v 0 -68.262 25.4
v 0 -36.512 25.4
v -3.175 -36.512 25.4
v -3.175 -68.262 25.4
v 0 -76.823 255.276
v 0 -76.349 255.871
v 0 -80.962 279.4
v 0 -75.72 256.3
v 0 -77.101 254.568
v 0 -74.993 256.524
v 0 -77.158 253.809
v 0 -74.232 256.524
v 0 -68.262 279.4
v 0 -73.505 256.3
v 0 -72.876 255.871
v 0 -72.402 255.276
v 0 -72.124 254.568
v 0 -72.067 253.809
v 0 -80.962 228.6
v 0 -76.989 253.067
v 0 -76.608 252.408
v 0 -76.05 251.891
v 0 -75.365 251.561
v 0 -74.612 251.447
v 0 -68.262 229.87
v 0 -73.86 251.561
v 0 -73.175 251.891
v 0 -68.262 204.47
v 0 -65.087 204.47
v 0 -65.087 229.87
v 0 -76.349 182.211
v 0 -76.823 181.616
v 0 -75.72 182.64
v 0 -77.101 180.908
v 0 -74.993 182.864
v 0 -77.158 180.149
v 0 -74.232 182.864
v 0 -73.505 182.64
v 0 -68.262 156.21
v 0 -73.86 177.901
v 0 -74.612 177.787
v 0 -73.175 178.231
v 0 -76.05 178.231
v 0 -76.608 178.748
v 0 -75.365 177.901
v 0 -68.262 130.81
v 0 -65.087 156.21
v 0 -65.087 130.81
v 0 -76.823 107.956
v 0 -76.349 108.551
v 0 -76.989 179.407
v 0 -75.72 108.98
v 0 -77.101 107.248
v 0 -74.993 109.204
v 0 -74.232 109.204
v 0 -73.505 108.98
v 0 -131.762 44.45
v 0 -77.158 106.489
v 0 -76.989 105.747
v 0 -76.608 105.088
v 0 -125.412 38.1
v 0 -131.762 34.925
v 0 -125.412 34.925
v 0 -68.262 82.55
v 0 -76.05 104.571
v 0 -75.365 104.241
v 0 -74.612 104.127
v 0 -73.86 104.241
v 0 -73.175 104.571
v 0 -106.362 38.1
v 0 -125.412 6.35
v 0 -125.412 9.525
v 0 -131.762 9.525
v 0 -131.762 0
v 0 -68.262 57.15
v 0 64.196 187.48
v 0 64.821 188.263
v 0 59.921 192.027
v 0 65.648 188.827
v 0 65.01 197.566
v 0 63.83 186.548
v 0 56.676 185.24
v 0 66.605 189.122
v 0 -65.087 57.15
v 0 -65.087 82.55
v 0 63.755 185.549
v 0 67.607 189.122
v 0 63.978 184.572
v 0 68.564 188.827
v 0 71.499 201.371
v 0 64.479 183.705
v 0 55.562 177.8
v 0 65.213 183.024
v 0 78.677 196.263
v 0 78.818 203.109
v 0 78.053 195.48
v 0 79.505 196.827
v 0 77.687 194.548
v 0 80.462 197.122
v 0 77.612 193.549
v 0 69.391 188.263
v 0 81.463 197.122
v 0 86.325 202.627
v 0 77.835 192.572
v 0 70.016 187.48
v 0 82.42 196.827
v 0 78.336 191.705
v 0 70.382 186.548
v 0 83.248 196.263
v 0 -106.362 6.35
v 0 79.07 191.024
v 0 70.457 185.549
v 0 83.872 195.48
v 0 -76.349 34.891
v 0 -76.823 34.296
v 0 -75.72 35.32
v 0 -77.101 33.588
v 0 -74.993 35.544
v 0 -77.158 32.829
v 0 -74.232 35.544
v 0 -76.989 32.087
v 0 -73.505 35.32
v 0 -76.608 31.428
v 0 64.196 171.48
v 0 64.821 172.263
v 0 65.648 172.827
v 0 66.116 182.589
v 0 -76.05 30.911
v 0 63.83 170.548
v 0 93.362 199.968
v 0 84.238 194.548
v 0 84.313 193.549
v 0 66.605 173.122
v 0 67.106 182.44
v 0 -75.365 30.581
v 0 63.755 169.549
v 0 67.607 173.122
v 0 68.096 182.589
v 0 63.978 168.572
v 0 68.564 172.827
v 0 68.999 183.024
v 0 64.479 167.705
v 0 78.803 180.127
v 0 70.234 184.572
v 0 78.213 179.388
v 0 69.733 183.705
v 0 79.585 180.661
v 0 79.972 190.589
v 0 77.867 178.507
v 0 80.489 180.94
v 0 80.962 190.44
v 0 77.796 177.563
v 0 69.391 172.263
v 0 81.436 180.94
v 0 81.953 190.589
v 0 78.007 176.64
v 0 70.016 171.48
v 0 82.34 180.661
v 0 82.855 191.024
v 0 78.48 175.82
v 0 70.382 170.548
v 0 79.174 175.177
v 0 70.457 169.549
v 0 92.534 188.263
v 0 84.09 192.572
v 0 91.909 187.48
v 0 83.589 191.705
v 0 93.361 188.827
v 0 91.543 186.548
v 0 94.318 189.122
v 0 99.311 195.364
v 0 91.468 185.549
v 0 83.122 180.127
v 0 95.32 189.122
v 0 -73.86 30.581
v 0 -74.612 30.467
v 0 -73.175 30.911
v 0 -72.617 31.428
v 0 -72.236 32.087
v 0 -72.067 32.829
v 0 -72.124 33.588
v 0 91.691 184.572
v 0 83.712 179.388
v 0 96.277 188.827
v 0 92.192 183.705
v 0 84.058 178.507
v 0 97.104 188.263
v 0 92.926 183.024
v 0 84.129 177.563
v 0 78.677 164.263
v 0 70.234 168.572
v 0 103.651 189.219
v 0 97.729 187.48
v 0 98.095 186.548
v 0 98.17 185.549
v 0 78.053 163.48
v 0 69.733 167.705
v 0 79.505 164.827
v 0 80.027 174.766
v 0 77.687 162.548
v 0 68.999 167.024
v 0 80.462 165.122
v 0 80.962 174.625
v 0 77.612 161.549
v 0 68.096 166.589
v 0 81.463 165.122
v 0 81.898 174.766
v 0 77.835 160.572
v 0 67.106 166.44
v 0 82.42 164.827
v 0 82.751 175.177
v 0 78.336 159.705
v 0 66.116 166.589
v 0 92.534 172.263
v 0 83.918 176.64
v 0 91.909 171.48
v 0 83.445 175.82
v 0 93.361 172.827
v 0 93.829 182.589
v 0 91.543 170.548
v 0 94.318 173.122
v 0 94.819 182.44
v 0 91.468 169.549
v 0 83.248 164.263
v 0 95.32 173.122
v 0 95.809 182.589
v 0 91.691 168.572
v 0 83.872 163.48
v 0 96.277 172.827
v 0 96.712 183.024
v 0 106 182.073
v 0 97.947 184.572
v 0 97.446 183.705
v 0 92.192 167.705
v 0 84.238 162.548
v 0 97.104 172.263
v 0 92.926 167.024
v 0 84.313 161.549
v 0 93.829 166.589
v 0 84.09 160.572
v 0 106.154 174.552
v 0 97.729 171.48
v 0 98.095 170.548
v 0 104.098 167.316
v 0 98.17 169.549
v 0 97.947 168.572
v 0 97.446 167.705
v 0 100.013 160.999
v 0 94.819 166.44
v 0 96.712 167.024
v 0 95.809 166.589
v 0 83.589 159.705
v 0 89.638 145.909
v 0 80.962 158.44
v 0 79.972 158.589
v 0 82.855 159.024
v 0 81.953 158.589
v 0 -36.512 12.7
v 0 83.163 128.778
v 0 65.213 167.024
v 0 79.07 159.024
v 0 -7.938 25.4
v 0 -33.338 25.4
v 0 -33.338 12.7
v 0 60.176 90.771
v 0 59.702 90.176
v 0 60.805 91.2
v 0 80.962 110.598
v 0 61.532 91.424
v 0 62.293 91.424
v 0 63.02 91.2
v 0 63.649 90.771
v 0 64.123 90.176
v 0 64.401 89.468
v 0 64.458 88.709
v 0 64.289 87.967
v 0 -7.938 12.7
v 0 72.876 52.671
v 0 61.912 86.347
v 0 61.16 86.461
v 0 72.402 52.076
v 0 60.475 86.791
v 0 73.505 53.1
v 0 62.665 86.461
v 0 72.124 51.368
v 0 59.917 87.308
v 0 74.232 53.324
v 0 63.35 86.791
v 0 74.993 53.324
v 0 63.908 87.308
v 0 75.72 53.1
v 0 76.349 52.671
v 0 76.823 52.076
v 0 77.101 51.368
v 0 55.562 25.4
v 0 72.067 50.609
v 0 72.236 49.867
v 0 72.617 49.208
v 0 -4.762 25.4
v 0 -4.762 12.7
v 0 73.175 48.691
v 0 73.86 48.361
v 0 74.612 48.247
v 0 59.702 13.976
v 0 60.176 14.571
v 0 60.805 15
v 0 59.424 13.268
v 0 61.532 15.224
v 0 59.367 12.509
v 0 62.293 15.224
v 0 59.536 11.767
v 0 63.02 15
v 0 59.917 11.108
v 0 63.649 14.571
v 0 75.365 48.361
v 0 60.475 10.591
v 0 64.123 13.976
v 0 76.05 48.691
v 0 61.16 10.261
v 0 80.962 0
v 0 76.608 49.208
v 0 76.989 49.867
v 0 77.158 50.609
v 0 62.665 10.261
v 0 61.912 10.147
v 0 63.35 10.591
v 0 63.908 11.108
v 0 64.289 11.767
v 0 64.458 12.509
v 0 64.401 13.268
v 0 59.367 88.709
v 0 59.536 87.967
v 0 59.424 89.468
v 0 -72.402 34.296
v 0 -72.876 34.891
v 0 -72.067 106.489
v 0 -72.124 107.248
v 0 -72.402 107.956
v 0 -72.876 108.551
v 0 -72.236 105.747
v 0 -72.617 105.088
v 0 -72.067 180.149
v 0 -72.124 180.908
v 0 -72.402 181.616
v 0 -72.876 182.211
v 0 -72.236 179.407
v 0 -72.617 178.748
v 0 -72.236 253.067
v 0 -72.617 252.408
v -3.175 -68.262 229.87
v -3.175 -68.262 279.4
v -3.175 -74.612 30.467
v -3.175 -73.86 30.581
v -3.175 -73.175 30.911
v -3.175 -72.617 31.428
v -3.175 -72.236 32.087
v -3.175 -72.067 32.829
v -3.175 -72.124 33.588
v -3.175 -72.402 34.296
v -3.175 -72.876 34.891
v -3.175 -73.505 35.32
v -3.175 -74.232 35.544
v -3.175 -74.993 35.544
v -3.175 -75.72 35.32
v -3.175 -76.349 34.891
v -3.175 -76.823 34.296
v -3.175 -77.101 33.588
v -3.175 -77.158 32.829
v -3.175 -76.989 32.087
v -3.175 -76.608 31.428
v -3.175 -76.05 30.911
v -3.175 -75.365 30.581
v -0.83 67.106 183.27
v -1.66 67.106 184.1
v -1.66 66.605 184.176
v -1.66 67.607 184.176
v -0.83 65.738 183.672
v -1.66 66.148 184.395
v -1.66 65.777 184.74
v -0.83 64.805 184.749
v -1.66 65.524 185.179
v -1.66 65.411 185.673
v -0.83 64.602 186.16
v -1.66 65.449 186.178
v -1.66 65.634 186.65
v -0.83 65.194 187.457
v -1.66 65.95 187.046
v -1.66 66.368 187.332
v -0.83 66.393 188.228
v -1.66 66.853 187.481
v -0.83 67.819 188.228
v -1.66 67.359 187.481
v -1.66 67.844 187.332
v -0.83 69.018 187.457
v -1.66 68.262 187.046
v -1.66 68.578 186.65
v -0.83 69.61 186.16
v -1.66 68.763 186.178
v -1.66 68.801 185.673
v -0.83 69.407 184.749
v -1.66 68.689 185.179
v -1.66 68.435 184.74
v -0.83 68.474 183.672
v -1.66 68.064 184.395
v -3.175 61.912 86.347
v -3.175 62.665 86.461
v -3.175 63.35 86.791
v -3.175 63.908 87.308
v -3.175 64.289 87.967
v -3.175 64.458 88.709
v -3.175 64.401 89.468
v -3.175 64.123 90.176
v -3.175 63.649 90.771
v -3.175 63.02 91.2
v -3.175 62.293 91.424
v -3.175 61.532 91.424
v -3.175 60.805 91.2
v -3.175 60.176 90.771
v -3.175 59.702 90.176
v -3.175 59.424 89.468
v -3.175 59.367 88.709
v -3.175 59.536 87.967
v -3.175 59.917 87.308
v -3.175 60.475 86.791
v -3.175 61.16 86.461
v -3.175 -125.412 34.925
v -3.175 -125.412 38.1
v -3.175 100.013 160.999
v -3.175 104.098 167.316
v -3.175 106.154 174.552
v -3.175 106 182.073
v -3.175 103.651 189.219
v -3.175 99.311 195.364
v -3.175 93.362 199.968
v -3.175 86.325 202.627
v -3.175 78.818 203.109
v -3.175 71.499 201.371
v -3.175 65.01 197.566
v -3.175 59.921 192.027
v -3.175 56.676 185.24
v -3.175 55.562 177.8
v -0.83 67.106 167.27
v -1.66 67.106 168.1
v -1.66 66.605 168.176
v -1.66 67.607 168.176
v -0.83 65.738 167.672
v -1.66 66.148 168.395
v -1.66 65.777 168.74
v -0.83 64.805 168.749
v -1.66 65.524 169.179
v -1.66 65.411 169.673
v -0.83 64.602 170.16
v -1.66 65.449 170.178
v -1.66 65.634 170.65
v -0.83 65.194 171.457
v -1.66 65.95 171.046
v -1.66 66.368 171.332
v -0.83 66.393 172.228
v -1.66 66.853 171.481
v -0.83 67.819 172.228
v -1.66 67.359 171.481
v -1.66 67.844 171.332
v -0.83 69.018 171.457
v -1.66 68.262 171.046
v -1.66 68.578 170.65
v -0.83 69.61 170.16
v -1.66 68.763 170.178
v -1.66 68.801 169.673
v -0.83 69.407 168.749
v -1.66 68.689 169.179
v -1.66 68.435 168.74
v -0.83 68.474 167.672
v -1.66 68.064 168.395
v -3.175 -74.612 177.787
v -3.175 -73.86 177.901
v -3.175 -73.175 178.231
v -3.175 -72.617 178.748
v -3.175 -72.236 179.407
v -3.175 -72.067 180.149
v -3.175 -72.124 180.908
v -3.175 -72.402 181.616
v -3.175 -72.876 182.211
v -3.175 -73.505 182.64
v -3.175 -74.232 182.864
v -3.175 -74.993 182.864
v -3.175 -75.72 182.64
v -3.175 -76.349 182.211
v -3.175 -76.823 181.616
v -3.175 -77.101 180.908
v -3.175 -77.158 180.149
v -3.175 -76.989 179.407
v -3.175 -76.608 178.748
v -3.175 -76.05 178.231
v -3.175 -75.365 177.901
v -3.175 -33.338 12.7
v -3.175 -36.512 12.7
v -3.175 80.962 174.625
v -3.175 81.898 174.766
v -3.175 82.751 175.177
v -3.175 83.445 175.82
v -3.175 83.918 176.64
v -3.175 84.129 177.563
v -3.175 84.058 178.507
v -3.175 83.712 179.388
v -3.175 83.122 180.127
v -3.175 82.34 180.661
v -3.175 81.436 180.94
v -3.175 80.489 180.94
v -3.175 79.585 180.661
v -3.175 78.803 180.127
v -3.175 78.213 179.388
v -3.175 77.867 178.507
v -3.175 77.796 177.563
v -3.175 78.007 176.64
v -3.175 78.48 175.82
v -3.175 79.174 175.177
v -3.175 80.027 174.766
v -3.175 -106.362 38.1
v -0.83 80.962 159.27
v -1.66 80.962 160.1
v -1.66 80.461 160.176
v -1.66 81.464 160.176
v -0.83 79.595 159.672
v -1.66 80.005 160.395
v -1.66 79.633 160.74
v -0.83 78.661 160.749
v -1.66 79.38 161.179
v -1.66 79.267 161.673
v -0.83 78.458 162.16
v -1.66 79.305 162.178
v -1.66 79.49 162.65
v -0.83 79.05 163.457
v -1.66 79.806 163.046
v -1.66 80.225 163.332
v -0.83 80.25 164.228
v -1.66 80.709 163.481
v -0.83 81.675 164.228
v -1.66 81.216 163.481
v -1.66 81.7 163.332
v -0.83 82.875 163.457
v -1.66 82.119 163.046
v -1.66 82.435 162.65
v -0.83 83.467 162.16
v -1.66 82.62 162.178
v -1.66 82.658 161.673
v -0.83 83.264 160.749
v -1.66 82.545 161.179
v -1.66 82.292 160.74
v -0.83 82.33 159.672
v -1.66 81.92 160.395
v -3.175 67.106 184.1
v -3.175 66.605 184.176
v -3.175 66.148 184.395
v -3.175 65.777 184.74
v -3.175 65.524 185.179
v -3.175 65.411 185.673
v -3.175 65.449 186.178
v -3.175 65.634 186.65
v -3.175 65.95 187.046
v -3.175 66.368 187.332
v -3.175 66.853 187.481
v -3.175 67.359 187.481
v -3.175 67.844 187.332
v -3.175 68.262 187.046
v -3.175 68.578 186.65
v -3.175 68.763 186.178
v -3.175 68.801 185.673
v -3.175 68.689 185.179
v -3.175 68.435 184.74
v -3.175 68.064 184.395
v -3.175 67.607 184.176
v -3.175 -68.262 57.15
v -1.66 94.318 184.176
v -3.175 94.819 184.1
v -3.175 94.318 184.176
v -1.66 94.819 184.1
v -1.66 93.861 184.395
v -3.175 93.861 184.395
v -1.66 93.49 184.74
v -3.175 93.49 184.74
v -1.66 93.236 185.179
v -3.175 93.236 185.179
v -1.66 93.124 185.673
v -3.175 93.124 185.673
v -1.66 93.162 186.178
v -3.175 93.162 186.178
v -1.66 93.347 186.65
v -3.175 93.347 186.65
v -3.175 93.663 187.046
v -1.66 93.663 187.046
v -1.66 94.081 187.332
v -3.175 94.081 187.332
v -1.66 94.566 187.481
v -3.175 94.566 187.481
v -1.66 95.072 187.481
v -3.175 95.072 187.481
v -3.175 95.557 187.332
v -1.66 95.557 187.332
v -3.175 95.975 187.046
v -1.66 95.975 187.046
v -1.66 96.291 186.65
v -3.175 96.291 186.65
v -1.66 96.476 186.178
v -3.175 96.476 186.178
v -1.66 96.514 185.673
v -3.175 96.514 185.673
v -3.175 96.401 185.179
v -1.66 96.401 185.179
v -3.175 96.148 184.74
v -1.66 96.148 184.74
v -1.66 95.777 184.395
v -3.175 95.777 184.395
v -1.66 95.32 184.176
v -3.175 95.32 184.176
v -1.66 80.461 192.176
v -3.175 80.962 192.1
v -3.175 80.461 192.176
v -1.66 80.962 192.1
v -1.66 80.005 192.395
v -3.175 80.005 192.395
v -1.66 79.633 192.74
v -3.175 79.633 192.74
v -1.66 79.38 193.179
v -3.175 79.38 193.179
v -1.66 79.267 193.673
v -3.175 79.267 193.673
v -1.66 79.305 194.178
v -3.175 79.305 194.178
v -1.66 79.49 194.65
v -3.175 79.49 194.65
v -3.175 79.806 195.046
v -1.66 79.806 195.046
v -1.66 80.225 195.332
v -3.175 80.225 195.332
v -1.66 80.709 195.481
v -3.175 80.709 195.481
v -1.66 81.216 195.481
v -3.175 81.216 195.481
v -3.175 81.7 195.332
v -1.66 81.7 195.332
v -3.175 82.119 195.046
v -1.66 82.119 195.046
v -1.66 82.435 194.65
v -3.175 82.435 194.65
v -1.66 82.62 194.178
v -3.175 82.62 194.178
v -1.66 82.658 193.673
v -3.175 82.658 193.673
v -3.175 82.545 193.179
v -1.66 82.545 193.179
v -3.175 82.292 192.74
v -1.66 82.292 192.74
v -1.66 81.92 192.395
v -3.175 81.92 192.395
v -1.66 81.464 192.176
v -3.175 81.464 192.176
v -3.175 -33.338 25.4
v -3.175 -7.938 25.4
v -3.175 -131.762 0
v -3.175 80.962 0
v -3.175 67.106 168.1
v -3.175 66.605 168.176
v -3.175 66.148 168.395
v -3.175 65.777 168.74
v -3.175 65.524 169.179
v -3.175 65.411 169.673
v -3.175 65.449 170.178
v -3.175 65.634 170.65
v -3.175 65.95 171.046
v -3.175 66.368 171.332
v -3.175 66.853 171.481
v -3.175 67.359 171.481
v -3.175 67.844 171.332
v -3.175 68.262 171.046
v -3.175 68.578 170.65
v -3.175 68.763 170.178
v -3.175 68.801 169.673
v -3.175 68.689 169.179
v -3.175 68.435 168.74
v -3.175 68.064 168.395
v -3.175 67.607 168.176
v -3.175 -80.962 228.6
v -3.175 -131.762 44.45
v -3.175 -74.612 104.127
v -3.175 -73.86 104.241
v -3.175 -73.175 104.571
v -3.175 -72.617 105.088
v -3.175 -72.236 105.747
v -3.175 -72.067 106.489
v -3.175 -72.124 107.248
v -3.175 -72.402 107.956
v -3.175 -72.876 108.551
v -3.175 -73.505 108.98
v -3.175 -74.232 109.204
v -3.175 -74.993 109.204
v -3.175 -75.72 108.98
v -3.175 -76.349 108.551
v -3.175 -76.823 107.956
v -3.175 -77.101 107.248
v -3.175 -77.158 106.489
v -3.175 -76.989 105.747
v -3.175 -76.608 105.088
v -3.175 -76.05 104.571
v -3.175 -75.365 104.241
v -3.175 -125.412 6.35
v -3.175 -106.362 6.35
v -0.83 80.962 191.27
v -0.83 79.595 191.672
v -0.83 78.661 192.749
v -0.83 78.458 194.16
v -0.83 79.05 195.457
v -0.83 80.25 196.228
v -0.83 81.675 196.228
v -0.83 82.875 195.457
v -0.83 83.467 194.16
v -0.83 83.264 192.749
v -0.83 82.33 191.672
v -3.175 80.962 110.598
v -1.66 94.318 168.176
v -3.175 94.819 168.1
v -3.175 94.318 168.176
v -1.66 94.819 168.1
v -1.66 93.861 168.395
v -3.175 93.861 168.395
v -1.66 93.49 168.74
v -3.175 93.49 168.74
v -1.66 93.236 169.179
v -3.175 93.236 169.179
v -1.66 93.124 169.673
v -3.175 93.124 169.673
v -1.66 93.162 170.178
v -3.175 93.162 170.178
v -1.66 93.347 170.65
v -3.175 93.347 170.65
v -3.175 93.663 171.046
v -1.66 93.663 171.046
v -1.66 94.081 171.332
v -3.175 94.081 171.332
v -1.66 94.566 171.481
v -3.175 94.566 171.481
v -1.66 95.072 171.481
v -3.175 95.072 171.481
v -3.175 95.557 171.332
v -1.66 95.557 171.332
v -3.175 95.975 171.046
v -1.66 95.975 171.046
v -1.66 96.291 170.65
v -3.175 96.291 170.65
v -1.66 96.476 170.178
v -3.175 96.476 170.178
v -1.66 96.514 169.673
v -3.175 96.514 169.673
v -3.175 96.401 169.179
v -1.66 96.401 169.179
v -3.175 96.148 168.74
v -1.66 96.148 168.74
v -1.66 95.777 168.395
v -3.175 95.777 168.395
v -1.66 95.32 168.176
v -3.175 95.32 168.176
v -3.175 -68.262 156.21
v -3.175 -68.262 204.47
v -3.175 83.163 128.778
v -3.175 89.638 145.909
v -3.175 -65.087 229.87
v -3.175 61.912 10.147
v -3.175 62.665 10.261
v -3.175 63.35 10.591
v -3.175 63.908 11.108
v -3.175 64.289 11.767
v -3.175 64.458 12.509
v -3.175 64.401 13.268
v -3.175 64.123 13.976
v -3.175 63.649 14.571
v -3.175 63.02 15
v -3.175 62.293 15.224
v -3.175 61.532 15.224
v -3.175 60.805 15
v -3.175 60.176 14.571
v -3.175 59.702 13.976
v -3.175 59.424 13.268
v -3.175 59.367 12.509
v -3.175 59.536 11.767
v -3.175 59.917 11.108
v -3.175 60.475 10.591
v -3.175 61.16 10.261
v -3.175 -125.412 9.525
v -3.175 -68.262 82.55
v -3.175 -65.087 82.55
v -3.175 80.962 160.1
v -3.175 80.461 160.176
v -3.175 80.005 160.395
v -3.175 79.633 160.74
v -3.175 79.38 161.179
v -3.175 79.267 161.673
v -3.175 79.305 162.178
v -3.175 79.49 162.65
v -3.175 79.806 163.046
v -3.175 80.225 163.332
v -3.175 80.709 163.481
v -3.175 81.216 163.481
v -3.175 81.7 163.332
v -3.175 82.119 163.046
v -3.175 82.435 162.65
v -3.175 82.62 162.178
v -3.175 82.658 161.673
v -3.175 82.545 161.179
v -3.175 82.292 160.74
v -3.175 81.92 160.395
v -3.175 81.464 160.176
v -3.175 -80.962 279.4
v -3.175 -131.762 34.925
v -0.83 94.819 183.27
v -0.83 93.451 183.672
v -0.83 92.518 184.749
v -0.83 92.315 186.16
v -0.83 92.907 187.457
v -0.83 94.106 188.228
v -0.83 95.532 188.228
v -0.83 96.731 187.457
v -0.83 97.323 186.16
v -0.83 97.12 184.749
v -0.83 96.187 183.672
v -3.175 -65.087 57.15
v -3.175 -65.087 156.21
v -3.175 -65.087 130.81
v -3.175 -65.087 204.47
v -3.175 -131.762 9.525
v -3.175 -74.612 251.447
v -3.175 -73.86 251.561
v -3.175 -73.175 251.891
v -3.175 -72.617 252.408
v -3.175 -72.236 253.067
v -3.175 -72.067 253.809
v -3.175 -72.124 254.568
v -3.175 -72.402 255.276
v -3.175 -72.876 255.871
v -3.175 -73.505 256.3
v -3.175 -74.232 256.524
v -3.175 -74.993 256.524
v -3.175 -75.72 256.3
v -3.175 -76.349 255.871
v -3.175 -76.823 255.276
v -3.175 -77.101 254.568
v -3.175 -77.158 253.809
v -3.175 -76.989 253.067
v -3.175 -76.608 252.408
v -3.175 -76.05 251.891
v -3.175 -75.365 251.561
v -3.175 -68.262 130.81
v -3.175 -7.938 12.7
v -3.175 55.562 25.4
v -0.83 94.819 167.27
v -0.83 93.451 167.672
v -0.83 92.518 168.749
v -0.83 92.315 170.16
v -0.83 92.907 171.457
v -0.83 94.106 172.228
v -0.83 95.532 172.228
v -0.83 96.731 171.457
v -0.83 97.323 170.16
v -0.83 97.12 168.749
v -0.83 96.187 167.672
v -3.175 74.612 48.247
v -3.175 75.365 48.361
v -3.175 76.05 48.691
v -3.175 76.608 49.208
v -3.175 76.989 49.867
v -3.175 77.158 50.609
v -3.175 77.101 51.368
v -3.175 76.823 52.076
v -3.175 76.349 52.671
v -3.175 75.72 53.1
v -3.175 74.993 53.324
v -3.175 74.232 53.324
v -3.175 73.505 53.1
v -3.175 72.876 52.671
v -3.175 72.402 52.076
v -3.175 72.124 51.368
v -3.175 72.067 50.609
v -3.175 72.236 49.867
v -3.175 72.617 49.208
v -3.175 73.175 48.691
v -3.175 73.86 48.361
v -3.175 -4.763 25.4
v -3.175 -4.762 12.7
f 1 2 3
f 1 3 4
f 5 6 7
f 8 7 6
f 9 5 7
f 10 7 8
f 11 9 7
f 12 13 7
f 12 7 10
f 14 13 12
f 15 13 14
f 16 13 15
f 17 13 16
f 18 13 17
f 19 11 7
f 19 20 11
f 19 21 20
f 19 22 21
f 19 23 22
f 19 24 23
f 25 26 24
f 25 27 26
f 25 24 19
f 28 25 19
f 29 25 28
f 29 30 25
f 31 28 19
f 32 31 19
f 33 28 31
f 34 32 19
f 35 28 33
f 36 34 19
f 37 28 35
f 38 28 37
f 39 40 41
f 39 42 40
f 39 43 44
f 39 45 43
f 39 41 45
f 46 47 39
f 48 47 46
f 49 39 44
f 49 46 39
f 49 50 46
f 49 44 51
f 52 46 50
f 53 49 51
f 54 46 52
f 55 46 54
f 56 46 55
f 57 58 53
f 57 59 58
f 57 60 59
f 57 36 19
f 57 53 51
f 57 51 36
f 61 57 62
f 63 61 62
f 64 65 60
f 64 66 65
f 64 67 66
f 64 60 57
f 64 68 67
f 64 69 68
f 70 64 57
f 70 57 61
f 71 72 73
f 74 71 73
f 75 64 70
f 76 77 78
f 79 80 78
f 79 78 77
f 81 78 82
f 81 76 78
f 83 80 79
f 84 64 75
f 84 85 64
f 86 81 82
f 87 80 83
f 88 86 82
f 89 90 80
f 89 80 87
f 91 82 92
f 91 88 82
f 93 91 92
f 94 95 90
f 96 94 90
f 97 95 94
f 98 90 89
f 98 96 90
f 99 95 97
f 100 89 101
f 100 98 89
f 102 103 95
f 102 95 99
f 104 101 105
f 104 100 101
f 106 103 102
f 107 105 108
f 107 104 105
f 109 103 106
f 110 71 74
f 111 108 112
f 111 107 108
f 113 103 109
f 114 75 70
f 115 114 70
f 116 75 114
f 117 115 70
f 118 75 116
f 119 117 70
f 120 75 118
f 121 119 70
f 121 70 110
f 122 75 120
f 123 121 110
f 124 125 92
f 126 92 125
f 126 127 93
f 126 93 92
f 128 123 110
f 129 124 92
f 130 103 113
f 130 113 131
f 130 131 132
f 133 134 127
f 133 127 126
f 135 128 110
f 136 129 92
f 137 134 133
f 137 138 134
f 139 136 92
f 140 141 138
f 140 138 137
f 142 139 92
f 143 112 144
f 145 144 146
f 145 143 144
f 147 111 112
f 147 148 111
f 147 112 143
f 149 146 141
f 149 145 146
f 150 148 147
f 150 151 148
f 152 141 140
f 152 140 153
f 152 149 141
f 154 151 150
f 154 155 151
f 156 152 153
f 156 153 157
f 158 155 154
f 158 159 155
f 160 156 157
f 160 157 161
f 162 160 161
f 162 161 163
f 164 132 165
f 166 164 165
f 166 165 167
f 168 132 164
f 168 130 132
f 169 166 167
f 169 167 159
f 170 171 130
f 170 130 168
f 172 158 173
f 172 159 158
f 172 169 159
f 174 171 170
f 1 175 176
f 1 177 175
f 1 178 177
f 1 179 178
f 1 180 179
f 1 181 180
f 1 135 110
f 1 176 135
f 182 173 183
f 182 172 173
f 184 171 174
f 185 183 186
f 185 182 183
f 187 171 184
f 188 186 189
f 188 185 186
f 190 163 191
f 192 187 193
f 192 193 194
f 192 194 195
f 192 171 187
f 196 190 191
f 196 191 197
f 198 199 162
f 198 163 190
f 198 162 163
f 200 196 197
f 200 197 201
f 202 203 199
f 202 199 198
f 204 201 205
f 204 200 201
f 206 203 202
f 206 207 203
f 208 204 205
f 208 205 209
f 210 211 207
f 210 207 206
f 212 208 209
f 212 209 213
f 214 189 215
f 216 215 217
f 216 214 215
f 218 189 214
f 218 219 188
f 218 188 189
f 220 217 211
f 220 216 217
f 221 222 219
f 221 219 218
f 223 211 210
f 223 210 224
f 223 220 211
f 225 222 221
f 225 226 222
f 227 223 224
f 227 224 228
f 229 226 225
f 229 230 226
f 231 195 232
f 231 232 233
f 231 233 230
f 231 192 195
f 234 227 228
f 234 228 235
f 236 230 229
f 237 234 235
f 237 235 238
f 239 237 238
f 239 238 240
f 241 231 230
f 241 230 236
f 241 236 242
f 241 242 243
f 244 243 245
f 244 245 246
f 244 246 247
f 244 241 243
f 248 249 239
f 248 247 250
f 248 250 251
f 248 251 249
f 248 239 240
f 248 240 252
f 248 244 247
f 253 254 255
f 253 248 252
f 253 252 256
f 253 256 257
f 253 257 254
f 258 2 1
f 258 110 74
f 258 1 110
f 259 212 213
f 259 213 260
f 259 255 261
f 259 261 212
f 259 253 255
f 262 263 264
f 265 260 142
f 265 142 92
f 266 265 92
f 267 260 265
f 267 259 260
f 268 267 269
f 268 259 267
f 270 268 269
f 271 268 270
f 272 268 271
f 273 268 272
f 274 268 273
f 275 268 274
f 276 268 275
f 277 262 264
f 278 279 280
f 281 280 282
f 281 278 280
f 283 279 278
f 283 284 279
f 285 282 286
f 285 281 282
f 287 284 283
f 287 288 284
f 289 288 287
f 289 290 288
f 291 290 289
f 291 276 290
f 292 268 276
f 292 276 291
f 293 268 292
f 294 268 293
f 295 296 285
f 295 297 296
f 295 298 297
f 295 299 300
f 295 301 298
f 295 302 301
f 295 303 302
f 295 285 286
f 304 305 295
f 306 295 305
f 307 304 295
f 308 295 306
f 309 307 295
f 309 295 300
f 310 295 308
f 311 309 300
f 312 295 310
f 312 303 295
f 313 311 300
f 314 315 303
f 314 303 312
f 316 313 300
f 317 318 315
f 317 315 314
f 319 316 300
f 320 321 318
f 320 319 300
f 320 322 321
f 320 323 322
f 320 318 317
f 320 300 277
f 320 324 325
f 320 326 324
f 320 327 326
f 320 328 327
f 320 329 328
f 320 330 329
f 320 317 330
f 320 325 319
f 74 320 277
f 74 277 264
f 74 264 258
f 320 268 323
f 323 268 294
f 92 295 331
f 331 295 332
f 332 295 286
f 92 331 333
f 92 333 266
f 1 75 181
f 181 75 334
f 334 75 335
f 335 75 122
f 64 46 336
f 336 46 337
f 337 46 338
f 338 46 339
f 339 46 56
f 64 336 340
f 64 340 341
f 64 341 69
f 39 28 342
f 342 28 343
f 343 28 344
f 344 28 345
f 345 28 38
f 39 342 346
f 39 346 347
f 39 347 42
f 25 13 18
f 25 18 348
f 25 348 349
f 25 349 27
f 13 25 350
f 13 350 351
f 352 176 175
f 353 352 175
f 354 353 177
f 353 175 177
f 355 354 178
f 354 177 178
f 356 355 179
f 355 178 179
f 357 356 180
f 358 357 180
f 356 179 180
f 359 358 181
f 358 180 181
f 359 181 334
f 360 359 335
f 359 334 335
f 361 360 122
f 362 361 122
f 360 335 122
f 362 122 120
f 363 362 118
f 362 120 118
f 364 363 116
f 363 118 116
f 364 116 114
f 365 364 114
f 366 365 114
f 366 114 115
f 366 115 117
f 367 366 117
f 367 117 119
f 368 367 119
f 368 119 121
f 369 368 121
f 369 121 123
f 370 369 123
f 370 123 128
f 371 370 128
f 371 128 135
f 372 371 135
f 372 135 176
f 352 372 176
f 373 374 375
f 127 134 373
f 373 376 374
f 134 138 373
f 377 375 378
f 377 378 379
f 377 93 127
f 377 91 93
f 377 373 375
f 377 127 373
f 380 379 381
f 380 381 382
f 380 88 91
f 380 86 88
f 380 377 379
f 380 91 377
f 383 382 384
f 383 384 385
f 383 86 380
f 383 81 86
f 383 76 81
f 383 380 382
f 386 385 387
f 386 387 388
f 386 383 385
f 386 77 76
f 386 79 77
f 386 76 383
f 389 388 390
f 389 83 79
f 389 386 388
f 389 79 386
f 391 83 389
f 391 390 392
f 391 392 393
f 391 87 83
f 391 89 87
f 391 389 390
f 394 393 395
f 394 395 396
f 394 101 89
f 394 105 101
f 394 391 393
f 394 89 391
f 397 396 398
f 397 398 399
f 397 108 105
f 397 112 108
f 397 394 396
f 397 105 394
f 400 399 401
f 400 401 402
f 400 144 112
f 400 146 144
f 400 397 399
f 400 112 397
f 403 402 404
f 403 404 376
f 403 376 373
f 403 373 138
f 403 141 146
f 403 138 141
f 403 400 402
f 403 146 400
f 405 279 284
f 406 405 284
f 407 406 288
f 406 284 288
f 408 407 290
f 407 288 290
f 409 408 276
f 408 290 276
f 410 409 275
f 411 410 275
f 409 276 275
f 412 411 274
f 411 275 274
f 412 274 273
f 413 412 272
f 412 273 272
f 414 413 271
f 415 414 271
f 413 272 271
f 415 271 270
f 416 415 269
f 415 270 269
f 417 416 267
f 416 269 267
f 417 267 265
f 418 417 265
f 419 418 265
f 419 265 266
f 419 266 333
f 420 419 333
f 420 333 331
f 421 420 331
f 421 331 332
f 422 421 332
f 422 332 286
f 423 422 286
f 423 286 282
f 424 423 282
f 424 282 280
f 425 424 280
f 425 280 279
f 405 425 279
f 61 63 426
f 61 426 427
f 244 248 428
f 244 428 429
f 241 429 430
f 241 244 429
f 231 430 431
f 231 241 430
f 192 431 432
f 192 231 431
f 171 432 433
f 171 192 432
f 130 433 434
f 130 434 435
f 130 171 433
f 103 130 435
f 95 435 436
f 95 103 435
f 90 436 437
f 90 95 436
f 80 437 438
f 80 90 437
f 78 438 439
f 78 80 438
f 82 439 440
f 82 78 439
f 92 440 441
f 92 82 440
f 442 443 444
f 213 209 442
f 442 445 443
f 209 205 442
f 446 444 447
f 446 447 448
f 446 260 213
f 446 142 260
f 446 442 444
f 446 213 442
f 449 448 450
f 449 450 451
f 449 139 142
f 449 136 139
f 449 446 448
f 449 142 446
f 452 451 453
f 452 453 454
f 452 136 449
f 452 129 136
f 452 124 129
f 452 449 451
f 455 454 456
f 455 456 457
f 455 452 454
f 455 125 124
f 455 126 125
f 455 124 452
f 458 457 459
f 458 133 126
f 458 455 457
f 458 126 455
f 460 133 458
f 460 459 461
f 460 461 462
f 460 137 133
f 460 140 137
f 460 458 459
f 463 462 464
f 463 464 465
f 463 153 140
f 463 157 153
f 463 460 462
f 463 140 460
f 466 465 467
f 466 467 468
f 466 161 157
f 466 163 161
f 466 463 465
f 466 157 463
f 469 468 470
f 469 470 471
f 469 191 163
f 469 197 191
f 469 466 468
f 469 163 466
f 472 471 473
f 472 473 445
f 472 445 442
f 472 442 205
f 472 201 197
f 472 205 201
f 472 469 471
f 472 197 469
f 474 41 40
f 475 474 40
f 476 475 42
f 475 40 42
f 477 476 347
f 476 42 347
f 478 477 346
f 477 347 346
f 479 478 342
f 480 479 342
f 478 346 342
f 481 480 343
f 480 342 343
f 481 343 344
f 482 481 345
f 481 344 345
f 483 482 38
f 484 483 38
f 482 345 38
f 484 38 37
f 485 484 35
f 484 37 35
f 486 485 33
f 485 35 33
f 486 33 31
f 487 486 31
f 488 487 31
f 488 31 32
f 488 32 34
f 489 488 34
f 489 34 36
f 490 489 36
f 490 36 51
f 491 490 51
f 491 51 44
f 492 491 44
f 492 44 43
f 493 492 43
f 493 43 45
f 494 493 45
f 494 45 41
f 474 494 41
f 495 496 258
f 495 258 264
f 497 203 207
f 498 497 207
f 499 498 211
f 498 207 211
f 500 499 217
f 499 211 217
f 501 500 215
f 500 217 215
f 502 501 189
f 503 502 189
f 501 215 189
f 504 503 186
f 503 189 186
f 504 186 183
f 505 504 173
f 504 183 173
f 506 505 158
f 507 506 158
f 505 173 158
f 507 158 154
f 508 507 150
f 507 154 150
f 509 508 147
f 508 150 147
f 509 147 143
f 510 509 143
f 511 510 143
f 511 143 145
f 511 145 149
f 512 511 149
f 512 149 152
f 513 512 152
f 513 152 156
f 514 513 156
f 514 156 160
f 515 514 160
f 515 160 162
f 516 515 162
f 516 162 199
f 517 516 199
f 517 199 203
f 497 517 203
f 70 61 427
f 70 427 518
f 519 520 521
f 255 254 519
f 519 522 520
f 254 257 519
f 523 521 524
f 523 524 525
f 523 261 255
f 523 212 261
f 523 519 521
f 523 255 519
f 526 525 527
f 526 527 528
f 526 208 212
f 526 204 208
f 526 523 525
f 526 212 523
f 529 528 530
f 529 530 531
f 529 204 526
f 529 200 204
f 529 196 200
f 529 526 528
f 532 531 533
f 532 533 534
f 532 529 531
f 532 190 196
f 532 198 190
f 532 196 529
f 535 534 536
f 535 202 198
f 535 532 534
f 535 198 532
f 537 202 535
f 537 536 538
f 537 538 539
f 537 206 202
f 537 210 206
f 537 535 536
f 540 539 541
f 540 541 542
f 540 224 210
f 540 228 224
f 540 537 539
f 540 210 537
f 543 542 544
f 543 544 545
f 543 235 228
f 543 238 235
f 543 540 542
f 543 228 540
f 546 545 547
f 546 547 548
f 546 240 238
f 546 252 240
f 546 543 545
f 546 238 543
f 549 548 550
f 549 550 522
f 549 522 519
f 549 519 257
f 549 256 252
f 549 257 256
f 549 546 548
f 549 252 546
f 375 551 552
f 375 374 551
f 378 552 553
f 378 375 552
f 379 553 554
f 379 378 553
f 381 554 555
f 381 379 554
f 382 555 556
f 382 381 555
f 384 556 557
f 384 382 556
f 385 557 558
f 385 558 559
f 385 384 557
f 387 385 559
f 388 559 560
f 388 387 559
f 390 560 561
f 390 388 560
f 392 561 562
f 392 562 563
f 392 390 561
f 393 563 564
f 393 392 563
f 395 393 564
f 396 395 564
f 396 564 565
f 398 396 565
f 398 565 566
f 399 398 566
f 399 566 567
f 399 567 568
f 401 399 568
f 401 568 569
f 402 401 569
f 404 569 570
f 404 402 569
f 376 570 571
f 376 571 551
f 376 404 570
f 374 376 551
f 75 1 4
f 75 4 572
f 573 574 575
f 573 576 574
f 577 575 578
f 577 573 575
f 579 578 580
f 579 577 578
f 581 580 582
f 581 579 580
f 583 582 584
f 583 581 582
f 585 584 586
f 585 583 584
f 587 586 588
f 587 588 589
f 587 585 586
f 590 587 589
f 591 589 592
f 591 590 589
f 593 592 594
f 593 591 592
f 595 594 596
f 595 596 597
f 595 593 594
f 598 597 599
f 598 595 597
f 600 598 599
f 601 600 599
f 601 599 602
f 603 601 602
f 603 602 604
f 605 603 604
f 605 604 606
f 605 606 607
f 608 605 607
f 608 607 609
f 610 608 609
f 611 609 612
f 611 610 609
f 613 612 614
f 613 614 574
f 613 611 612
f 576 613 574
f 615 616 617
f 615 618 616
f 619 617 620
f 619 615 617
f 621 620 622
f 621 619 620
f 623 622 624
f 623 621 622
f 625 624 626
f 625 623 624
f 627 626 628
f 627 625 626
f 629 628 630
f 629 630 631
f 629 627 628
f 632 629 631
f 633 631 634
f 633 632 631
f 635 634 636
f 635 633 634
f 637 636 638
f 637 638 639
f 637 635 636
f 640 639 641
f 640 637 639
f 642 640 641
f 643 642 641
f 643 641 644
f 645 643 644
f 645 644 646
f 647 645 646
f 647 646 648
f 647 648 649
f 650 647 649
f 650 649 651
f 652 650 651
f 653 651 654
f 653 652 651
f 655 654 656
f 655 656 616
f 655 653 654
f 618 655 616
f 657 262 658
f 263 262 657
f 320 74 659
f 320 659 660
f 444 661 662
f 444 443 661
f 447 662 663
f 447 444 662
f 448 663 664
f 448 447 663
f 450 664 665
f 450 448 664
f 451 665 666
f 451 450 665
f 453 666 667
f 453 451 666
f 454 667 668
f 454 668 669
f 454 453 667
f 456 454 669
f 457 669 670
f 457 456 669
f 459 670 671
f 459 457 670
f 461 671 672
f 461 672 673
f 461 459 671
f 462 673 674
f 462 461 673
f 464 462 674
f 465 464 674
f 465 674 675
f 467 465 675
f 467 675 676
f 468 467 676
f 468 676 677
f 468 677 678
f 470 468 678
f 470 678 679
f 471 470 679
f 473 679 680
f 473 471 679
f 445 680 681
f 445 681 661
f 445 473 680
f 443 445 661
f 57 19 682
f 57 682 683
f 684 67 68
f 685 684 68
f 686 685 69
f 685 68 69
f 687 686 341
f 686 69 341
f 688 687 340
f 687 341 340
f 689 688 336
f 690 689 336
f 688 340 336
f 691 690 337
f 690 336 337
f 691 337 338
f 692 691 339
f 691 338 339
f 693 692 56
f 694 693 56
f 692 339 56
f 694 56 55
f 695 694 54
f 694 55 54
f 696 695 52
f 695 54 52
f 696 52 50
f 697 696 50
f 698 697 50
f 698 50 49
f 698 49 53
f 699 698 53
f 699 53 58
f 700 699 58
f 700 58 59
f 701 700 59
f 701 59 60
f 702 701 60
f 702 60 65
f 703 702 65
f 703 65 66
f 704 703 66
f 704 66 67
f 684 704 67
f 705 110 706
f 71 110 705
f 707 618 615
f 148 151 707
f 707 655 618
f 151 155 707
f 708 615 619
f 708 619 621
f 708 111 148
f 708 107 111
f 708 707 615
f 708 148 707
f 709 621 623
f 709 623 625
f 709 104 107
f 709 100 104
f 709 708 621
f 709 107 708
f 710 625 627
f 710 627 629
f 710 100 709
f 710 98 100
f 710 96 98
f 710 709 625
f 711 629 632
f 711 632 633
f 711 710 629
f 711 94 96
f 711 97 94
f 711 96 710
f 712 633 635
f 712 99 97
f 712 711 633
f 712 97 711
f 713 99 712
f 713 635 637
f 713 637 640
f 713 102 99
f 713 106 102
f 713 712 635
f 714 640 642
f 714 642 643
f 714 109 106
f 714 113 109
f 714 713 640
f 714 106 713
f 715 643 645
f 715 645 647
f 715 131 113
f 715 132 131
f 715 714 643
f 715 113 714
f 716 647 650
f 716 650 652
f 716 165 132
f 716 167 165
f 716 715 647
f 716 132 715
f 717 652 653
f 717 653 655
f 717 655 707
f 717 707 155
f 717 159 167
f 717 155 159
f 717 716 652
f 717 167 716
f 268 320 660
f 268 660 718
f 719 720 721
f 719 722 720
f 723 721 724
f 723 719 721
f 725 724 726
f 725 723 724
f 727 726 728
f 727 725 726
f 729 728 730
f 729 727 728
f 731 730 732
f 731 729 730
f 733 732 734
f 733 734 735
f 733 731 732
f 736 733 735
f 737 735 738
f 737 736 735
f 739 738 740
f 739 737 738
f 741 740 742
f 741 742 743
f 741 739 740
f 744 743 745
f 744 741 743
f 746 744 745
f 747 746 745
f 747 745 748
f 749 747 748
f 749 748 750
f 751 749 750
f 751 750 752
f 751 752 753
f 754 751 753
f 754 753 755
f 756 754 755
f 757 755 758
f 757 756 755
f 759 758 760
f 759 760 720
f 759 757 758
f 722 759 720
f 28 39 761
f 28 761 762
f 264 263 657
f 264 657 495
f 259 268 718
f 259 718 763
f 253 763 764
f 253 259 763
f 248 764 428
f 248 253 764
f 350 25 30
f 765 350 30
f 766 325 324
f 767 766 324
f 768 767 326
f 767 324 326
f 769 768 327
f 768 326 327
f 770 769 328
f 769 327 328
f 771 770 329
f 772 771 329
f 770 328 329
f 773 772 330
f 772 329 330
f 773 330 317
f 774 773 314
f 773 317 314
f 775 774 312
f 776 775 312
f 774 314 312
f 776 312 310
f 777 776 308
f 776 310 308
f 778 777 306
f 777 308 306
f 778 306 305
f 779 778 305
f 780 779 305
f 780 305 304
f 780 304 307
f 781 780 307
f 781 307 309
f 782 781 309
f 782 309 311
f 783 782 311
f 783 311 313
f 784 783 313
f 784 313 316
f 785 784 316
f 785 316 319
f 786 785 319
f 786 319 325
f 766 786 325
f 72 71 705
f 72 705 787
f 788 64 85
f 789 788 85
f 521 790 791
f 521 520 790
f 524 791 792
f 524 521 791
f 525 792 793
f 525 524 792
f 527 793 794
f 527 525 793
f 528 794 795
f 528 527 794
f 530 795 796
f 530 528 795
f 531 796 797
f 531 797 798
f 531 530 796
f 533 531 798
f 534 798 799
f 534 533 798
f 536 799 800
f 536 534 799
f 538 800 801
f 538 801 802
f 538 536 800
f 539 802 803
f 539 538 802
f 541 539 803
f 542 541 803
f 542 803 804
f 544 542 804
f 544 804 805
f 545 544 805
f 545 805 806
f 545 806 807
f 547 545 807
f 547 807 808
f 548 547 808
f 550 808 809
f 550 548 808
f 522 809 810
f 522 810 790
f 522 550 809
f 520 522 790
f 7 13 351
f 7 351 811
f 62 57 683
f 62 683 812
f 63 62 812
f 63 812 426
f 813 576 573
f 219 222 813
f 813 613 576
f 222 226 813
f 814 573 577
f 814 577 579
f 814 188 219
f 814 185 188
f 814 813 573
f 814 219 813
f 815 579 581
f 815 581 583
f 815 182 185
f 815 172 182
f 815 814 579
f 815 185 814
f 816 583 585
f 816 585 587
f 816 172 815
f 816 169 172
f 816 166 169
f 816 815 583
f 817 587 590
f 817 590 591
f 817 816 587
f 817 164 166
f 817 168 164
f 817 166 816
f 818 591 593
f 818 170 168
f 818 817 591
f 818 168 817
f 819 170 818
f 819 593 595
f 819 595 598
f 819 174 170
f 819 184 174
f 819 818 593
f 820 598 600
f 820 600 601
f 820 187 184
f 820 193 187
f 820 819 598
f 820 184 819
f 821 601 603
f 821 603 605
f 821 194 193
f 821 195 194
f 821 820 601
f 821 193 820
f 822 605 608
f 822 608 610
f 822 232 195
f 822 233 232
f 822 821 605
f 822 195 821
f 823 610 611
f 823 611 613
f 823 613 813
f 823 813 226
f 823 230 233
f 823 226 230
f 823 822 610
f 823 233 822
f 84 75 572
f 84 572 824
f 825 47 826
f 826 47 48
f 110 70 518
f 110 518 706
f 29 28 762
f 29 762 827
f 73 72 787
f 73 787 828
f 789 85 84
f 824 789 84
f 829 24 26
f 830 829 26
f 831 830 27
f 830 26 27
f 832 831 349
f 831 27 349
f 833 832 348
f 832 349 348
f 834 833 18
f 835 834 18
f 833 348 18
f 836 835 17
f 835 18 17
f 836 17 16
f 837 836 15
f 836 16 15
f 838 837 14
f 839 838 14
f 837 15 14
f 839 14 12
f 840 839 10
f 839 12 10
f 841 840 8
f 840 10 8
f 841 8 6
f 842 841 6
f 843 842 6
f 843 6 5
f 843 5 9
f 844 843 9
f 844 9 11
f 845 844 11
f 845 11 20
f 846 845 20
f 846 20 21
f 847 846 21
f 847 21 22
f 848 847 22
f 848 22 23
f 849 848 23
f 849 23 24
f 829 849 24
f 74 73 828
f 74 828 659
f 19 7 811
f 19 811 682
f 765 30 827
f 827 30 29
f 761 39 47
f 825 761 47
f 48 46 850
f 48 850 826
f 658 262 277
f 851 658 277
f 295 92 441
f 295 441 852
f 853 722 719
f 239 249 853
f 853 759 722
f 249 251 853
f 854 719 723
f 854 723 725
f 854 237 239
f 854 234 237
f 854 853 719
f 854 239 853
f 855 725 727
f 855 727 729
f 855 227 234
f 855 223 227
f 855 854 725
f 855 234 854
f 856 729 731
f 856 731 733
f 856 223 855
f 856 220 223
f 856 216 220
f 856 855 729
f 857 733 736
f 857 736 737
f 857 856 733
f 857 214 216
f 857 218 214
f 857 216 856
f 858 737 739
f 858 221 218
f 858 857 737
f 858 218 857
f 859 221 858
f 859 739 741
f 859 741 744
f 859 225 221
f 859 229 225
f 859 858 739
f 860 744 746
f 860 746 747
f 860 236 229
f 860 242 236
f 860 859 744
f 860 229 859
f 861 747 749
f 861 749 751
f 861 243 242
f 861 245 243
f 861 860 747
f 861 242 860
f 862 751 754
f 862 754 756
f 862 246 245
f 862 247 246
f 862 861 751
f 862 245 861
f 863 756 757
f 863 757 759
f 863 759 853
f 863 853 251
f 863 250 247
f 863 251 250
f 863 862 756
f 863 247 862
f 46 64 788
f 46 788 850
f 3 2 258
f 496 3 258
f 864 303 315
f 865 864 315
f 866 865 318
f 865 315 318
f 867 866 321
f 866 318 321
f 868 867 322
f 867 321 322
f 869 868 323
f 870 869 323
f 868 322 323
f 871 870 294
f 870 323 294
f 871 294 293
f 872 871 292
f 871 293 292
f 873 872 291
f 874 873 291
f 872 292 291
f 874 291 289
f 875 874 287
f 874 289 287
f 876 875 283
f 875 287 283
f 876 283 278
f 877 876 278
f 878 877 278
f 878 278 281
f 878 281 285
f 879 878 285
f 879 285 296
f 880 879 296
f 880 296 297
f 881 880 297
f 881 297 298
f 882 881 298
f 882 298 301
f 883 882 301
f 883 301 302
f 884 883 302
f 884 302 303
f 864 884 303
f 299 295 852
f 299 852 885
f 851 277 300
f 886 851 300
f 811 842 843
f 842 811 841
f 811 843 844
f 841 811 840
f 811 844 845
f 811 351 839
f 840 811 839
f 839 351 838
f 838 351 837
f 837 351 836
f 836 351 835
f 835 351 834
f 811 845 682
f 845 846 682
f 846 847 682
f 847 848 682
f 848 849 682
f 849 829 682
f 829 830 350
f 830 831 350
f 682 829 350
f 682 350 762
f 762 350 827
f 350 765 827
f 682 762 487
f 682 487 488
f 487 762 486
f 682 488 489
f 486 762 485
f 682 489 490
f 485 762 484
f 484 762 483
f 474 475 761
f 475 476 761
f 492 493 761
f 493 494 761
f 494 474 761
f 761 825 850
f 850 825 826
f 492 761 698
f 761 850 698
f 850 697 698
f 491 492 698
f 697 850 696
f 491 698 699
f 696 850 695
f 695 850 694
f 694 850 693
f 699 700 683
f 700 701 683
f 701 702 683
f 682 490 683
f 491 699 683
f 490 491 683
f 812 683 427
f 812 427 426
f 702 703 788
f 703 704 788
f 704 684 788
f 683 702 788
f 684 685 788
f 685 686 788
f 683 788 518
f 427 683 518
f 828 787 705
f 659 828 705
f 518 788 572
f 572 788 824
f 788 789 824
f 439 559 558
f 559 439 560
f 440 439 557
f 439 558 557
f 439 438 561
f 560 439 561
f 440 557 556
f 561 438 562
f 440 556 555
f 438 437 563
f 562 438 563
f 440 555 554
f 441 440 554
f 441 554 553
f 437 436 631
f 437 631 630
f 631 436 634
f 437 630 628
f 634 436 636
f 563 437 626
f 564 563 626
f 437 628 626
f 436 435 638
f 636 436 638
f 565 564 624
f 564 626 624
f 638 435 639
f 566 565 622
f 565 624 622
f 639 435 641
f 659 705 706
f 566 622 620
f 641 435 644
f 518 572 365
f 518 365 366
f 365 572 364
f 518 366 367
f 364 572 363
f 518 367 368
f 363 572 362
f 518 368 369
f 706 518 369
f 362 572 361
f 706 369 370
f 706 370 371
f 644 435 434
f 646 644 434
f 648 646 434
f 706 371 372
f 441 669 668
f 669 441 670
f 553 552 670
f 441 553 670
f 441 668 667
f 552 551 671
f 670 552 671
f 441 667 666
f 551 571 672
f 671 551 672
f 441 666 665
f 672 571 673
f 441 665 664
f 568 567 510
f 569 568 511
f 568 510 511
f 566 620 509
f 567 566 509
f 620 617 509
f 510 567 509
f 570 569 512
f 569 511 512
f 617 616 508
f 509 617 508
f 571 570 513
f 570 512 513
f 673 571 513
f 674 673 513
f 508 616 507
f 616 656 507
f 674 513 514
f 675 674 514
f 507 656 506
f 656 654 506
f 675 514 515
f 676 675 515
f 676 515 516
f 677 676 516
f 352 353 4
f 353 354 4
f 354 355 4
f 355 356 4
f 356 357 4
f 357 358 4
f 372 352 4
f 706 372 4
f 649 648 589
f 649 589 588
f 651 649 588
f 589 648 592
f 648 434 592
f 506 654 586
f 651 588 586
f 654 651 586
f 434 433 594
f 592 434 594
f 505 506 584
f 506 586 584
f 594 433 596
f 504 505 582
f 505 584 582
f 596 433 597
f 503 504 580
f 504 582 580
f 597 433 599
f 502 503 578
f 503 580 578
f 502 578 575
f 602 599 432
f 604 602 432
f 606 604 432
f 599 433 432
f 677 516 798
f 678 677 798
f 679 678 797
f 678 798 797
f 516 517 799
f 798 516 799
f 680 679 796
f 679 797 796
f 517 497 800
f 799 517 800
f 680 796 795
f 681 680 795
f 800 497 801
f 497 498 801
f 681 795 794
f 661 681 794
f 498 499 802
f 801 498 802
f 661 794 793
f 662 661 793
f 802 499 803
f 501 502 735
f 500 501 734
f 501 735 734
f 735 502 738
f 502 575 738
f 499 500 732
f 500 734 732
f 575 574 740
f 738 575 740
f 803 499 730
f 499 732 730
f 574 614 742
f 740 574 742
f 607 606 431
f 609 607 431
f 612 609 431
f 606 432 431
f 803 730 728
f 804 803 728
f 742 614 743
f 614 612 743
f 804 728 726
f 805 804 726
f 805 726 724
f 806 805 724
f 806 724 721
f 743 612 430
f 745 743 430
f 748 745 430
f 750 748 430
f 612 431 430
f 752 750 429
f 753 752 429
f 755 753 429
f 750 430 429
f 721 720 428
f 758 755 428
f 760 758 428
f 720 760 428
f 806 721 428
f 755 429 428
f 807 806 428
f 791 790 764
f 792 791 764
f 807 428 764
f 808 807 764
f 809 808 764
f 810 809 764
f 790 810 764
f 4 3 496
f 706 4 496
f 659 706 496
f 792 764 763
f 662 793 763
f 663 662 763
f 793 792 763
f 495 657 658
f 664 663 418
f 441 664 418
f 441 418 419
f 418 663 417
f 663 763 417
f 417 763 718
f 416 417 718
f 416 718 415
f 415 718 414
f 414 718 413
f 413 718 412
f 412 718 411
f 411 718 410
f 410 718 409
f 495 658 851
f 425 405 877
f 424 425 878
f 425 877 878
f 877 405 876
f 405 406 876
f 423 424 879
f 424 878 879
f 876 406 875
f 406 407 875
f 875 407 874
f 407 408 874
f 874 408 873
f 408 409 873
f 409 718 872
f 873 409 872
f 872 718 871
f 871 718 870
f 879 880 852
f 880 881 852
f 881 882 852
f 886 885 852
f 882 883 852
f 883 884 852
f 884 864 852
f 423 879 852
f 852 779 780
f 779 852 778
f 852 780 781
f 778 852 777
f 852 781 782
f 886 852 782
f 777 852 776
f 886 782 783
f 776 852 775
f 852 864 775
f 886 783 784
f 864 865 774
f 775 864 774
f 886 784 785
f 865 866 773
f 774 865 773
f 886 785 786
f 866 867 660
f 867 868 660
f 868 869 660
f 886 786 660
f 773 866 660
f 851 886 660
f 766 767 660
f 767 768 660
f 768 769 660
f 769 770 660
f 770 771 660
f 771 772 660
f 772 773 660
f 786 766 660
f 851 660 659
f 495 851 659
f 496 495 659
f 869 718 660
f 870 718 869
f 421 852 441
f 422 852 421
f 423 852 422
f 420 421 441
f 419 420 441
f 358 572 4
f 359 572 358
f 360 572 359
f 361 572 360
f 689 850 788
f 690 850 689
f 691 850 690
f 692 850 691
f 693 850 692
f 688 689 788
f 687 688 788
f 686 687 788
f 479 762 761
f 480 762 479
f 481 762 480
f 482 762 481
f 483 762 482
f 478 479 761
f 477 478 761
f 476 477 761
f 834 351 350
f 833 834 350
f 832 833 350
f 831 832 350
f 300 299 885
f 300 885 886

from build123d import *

# Parameters (mm, degrees)
BASE_FLANGE1_DEPTH           = 3.175
SKETCH8_W                    = 12.7
SKETCH8_H                    = 3.175
CUT_EXTRUDE2_DEPTH           = 309.926847379
SKETCH11_R                   = 3.175
CUT_EXTRUDE4_DEPTH           = 309.926847379
SKETCH21_R                   = 2.5527
CUT_EXTRUDE5_DEPTH           = 309.926847379
SKETCH23_W                   = 25.4
SKETCH23_H                   = 3.175
TAB1_DEPTH                   = 3.175
CSK_FOR_M3_SFHCS1_AT_2_COUNT = 2
CSK_FOR_M3_SFHCS1_AT_2_PITCH = 16
CSK_FOR_M3_SFHCS1_AT_3_COUNT = 2
CSK_FOR_M3_SFHCS1_AT_3_PITCH = 27.712812921
CSK_FOR_M3_SFHCS1_AT_4_COUNT = 2
CSK_FOR_M3_SFHCS1_AT_4_PITCH = 32
CSK_FOR_M3_SFHCS1_AT_5_COUNT = 2
CSK_FOR_M3_SFHCS1_AT_5_PITCH = 27.712812921
CSK_FOR_M3_SFHCS1_AT_6_COUNT = 2
CSK_FOR_M3_SFHCS1_AT_6_PITCH = 16


# Sheet-metal steps are written as plain solids
with BuildPart() as part:
    # Sketch1 → Base-Flange1 (new body)
    with BuildSketch(Plane(origin=(0, 0, 0), x_dir=(0, 0, -1), z_dir=(1, 0, 0))):
        with BuildLine():
            Line((0, -80.9625), (0, 80.9625))
            Line((0, 80.9625), (-110.597916699, 80.9625))
            ThreePointArc((-110.597916699, 80.9625), (-137.538685062, 85.883926782), (-160.999479175, 100.0125))
            ThreePointArc((-160.999479175, 100.0125), (-201.559524406, 89.942756121), (-177.8, 55.5625))
            Line((-177.8, 55.5625), (-25.4, 55.5625))
            Line((-25.4, 55.5625), (-25.4, -68.2625))
            Line((-25.4, -68.2625), (-279.4, -68.2625))
            Line((-279.4, -68.2625), (-279.4, -80.9625))
            Line((-279.4, -80.9625), (-228.6, -80.9625))
            Line((-228.6, -80.9625), (-44.45, -131.7625))
            Line((-44.45, -131.7625), (-34.925, -131.7625))
            Line((-34.925, -131.7625), (-34.925, -125.4125))
            Line((-34.925, -125.4125), (-38.1, -125.4125))
            Line((-38.1, -125.4125), (-38.1, -106.3625))
            Line((-38.1, -106.3625), (-6.35, -106.3625))
            Line((-6.35, -106.3625), (-6.35, -125.4125))
            Line((-6.35, -125.4125), (-9.525, -125.4125))
            Line((-9.525, -125.4125), (-9.525, -131.7625))
            Line((-9.525, -131.7625), (0, -131.7625))
            Line((0, -131.7625), (0, -80.9625))
        make_face()
    extrude(amount=-BASE_FLANGE1_DEPTH)

    # Sketch8 → Cut-Extrude2 (cut, through all)
    with BuildSketch(Plane(origin=(0, 0, 0), x_dir=(0, 0, -1), z_dir=(1, 0, 0))):
        with Locations((-19.05, -6.35)):
            Rectangle(SKETCH8_W, SKETCH8_H)
        with Locations((-19.05, -34.925)):
            Rectangle(SKETCH8_W, SKETCH8_H)
    extrude(amount=-CUT_EXTRUDE2_DEPTH, mode=Mode.SUBTRACT)

    # Sketch11 → Cut-Extrude4 (cut, through all)
    with BuildSketch(Plane(origin=(0, 0, 0), x_dir=(0, 0, -1), z_dir=(1, 0, 0))):
        with Locations((-177.8, 80.9625)):
            Circle(SKETCH11_R)
    extrude(amount=-CUT_EXTRUDE4_DEPTH, mode=Mode.SUBTRACT)

    # Sketch21 → Cut-Extrude5 (cut, through all)
    with BuildSketch(Plane(origin=(0, 0, 0), x_dir=(0, 0, -1), z_dir=(1, 0, 0))):
        with Locations((-33.02, -74.6125)):
            Circle(SKETCH21_R)
        with Locations((-106.68, -74.6125)):
            Circle(SKETCH21_R)
        with Locations((-180.34, -74.6125)):
            Circle(SKETCH21_R)
        with Locations((-254, -74.6125)):
            Circle(SKETCH21_R)
        with Locations((-12.7, 61.9125)):
            Circle(SKETCH21_R)
        with Locations((-50.8, 74.6125)):
            Circle(SKETCH21_R)
        with Locations((-88.9, 61.9125)):
            Circle(SKETCH21_R)
    extrude(amount=-CUT_EXTRUDE5_DEPTH, mode=Mode.SUBTRACT)

    # Sketch23 → Tab1 (add)
    with BuildSketch(Plane(origin=(0, 0, 0), x_dir=(0, 0, -1), z_dir=(1, 0, 0))):
        with Locations((-217.17, -66.675)):
            Rectangle(SKETCH23_W, SKETCH23_H)
        with Locations((-143.51, -66.675)):
            Rectangle(SKETCH23_W, SKETCH23_H)
        with Locations((-69.85, -66.675)):
            Rectangle(SKETCH23_W, SKETCH23_H)
    extrude(amount=-TAB1_DEPTH)

    # Sketch25 → CSK for M3 SFHCS1 (revolve, cut)
    with BuildSketch(Plane(origin=(0, 80.9625, 161.8), x_dir=(0, 0, -1), z_dir=(0, 1, 0))):
        Polygon((0, 0), (0, 3.175), (1.7, 3.175), (1.7, 1.66), (3.36, 0), align=None)
    csk_for_m3_sfhcs1 = revolve(axis=Axis((6.35, 80.9625, 161.8), (-1, 0, 0)), mode=Mode.SUBTRACT)

    # CSK for M3 SFHCS1 at 2: CSK for M3 SFHCS1 ×2
    with Locations(*[Vector(0, -0.8660254037844389, 0.4999999999999998) * (i * CSK_FOR_M3_SFHCS1_AT_2_PITCH) for i in range(1, CSK_FOR_M3_SFHCS1_AT_2_COUNT)]):
        add(csk_for_m3_sfhcs1, mode=Mode.SUBTRACT)

    # CSK for M3 SFHCS1 at 3: CSK for M3 SFHCS1 ×2
    with Locations(*[Vector(0, -0.500000000000002, 0.8660254037844376) * (i * CSK_FOR_M3_SFHCS1_AT_3_PITCH) for i in range(1, CSK_FOR_M3_SFHCS1_AT_3_COUNT)]):
        add(csk_for_m3_sfhcs1, mode=Mode.SUBTRACT)

    # CSK for M3 SFHCS1 at 4: CSK for M3 SFHCS1 ×2
    with Locations(*[(0, 0, i * CSK_FOR_M3_SFHCS1_AT_4_PITCH) for i in range(1, CSK_FOR_M3_SFHCS1_AT_4_COUNT)]):
        add(csk_for_m3_sfhcs1, mode=Mode.SUBTRACT)

    # CSK for M3 SFHCS1 at 5: CSK for M3 SFHCS1 ×2
    with Locations(*[Vector(0, 0.5000000000000007, 0.8660254037844384) * (i * CSK_FOR_M3_SFHCS1_AT_5_PITCH) for i in range(1, CSK_FOR_M3_SFHCS1_AT_5_COUNT)]):
        add(csk_for_m3_sfhcs1, mode=Mode.SUBTRACT)

    # CSK for M3 SFHCS1 at 6: CSK for M3 SFHCS1 ×2
    with Locations(*[Vector(0, 0.8660254037844379, 0.5000000000000013) * (i * CSK_FOR_M3_SFHCS1_AT_6_PITCH) for i in range(1, CSK_FOR_M3_SFHCS1_AT_6_COUNT)]):
        add(csk_for_m3_sfhcs1, mode=Mode.SUBTRACT)


solid = part.part
